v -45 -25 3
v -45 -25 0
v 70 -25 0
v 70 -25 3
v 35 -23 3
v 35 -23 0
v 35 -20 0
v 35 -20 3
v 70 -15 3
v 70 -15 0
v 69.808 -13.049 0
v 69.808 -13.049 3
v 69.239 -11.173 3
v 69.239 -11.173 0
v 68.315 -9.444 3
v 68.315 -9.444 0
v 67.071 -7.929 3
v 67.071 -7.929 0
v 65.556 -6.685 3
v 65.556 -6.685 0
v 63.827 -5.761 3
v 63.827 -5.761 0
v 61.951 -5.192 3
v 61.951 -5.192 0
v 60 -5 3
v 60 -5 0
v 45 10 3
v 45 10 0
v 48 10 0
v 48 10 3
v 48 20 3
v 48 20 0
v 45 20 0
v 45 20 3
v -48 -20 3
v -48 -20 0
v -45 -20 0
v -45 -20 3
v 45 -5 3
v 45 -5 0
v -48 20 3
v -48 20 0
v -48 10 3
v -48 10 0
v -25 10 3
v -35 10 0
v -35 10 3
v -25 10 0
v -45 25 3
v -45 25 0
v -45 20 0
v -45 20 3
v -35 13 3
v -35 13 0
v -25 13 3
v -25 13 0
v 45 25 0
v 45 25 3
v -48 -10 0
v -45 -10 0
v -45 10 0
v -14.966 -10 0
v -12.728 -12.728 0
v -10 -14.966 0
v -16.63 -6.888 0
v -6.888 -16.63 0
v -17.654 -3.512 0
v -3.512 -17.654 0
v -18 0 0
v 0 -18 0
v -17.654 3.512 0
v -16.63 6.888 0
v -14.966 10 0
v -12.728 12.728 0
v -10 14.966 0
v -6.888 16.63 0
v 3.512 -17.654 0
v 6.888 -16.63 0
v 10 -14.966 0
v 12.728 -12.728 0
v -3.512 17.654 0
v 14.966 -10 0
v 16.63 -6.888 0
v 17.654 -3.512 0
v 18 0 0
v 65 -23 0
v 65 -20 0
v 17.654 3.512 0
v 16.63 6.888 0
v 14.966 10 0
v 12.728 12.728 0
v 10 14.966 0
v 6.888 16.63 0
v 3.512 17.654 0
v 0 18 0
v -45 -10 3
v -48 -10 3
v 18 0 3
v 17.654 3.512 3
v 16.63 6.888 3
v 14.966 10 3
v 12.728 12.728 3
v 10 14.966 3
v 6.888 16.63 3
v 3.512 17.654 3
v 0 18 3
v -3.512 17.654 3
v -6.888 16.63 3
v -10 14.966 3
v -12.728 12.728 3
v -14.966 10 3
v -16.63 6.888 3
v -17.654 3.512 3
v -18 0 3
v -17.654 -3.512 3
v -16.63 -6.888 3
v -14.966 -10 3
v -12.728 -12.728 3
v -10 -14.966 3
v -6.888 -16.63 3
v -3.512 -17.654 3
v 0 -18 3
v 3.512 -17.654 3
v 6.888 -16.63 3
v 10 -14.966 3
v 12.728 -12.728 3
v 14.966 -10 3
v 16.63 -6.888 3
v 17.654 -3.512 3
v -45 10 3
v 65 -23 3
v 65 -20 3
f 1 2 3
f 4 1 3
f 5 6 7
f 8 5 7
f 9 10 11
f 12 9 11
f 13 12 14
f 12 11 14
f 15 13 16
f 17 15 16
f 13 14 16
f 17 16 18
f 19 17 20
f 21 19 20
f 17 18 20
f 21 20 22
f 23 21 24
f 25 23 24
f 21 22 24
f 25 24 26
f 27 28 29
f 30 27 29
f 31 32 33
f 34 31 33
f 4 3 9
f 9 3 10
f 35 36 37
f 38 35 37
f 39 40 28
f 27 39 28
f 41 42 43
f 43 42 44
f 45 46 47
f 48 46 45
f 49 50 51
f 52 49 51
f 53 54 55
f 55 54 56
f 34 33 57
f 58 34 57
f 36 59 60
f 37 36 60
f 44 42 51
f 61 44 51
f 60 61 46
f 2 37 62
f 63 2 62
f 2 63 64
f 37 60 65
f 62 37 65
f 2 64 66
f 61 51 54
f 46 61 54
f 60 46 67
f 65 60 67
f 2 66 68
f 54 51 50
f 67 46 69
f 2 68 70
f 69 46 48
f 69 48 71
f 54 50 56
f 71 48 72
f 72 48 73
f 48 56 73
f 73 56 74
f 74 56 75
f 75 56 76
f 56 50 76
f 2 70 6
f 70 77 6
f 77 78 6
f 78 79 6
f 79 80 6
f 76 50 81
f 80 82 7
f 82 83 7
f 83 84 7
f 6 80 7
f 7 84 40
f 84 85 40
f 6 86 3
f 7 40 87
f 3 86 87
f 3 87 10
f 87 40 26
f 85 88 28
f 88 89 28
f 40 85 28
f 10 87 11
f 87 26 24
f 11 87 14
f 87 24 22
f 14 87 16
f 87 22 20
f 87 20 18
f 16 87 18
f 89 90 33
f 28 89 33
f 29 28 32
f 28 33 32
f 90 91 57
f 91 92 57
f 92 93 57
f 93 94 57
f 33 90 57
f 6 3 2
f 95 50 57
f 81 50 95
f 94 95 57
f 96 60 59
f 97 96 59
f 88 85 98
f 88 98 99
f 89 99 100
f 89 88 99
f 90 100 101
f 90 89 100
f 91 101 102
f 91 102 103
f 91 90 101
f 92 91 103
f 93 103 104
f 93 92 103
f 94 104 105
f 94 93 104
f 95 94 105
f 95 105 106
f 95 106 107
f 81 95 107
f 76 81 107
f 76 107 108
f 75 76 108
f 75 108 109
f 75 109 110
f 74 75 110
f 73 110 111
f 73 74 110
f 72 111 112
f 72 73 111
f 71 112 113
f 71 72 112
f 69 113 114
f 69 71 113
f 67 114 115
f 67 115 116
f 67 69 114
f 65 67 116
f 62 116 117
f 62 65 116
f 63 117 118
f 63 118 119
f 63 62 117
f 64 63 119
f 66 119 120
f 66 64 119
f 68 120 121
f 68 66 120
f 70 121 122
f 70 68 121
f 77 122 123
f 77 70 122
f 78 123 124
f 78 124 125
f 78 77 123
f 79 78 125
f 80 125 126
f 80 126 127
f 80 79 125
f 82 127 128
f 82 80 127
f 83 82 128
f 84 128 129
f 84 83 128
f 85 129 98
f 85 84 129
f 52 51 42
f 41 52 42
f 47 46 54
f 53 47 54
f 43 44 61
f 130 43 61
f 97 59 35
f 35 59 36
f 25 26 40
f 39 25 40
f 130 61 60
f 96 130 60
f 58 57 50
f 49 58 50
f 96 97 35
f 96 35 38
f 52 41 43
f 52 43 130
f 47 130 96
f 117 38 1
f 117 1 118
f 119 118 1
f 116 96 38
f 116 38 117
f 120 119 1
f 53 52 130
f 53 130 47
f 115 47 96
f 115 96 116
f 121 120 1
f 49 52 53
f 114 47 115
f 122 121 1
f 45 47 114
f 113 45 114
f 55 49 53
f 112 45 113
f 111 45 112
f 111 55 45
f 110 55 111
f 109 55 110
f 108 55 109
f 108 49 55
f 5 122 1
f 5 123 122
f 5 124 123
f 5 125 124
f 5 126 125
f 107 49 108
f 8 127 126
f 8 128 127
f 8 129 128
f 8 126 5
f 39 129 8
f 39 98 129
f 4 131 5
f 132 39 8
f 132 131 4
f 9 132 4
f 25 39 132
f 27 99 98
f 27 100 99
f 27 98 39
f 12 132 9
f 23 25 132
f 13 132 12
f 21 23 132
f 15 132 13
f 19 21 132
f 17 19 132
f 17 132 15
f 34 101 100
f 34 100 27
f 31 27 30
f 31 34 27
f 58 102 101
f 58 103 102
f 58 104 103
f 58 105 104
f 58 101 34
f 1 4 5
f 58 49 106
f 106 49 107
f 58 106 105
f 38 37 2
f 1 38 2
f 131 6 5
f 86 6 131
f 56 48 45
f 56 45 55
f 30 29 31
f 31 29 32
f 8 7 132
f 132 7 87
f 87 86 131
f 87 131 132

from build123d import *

# Parameters (mm, degrees)
SKETCH1_R           = 18
SKETCH1_W           = 10
SKETCH1_H           = 3
SKETCH1_W_2         = 30
BOSS_EXTRUDE1_DEPTH = 3


with BuildPart() as part:
    # Sketch1 → Boss-Extrude1 (new body)
    with BuildSketch(Plane.XY):
        with BuildLine():
            Line((-45, 10), (-45, -10))
            Line((-45, -10), (-48, -10))
            Line((-48, -10), (-48, -20))
            Line((-48, -20), (-45, -20))
            Line((-45, -20), (-45, -25))
            Line((-45, -25), (70, -25))
            Line((70, -25), (70, -15))
            ThreePointArc((70, -15), (67.071067812, -7.928932188), (60, -5))
            Line((60, -5), (45, -5))
            Line((45, -5), (45, 10))
            Line((45, 10), (48, 10))
            Line((48, 10), (48, 20))
            Line((48, 20), (45, 20))
            Line((45, 20), (45, 25))
            Line((45, 25), (-45, 25))
            Line((-45, 25), (-45, 20))
            Line((-45, 20), (-48, 20))
            Line((-48, 20), (-48, 10))
            Line((-48, 10), (-45, 10))
        make_face()
        Circle(SKETCH1_R, mode=Mode.SUBTRACT)
        with Locations((-30, 11.5)):
            Rectangle(SKETCH1_W, SKETCH1_H, mode=Mode.SUBTRACT)
        with Locations((50, -21.5)):
            Rectangle(SKETCH1_W_2, SKETCH1_H, mode=Mode.SUBTRACT)
    extrude(amount=BOSS_EXTRUDE1_DEPTH)


solid = part.part
